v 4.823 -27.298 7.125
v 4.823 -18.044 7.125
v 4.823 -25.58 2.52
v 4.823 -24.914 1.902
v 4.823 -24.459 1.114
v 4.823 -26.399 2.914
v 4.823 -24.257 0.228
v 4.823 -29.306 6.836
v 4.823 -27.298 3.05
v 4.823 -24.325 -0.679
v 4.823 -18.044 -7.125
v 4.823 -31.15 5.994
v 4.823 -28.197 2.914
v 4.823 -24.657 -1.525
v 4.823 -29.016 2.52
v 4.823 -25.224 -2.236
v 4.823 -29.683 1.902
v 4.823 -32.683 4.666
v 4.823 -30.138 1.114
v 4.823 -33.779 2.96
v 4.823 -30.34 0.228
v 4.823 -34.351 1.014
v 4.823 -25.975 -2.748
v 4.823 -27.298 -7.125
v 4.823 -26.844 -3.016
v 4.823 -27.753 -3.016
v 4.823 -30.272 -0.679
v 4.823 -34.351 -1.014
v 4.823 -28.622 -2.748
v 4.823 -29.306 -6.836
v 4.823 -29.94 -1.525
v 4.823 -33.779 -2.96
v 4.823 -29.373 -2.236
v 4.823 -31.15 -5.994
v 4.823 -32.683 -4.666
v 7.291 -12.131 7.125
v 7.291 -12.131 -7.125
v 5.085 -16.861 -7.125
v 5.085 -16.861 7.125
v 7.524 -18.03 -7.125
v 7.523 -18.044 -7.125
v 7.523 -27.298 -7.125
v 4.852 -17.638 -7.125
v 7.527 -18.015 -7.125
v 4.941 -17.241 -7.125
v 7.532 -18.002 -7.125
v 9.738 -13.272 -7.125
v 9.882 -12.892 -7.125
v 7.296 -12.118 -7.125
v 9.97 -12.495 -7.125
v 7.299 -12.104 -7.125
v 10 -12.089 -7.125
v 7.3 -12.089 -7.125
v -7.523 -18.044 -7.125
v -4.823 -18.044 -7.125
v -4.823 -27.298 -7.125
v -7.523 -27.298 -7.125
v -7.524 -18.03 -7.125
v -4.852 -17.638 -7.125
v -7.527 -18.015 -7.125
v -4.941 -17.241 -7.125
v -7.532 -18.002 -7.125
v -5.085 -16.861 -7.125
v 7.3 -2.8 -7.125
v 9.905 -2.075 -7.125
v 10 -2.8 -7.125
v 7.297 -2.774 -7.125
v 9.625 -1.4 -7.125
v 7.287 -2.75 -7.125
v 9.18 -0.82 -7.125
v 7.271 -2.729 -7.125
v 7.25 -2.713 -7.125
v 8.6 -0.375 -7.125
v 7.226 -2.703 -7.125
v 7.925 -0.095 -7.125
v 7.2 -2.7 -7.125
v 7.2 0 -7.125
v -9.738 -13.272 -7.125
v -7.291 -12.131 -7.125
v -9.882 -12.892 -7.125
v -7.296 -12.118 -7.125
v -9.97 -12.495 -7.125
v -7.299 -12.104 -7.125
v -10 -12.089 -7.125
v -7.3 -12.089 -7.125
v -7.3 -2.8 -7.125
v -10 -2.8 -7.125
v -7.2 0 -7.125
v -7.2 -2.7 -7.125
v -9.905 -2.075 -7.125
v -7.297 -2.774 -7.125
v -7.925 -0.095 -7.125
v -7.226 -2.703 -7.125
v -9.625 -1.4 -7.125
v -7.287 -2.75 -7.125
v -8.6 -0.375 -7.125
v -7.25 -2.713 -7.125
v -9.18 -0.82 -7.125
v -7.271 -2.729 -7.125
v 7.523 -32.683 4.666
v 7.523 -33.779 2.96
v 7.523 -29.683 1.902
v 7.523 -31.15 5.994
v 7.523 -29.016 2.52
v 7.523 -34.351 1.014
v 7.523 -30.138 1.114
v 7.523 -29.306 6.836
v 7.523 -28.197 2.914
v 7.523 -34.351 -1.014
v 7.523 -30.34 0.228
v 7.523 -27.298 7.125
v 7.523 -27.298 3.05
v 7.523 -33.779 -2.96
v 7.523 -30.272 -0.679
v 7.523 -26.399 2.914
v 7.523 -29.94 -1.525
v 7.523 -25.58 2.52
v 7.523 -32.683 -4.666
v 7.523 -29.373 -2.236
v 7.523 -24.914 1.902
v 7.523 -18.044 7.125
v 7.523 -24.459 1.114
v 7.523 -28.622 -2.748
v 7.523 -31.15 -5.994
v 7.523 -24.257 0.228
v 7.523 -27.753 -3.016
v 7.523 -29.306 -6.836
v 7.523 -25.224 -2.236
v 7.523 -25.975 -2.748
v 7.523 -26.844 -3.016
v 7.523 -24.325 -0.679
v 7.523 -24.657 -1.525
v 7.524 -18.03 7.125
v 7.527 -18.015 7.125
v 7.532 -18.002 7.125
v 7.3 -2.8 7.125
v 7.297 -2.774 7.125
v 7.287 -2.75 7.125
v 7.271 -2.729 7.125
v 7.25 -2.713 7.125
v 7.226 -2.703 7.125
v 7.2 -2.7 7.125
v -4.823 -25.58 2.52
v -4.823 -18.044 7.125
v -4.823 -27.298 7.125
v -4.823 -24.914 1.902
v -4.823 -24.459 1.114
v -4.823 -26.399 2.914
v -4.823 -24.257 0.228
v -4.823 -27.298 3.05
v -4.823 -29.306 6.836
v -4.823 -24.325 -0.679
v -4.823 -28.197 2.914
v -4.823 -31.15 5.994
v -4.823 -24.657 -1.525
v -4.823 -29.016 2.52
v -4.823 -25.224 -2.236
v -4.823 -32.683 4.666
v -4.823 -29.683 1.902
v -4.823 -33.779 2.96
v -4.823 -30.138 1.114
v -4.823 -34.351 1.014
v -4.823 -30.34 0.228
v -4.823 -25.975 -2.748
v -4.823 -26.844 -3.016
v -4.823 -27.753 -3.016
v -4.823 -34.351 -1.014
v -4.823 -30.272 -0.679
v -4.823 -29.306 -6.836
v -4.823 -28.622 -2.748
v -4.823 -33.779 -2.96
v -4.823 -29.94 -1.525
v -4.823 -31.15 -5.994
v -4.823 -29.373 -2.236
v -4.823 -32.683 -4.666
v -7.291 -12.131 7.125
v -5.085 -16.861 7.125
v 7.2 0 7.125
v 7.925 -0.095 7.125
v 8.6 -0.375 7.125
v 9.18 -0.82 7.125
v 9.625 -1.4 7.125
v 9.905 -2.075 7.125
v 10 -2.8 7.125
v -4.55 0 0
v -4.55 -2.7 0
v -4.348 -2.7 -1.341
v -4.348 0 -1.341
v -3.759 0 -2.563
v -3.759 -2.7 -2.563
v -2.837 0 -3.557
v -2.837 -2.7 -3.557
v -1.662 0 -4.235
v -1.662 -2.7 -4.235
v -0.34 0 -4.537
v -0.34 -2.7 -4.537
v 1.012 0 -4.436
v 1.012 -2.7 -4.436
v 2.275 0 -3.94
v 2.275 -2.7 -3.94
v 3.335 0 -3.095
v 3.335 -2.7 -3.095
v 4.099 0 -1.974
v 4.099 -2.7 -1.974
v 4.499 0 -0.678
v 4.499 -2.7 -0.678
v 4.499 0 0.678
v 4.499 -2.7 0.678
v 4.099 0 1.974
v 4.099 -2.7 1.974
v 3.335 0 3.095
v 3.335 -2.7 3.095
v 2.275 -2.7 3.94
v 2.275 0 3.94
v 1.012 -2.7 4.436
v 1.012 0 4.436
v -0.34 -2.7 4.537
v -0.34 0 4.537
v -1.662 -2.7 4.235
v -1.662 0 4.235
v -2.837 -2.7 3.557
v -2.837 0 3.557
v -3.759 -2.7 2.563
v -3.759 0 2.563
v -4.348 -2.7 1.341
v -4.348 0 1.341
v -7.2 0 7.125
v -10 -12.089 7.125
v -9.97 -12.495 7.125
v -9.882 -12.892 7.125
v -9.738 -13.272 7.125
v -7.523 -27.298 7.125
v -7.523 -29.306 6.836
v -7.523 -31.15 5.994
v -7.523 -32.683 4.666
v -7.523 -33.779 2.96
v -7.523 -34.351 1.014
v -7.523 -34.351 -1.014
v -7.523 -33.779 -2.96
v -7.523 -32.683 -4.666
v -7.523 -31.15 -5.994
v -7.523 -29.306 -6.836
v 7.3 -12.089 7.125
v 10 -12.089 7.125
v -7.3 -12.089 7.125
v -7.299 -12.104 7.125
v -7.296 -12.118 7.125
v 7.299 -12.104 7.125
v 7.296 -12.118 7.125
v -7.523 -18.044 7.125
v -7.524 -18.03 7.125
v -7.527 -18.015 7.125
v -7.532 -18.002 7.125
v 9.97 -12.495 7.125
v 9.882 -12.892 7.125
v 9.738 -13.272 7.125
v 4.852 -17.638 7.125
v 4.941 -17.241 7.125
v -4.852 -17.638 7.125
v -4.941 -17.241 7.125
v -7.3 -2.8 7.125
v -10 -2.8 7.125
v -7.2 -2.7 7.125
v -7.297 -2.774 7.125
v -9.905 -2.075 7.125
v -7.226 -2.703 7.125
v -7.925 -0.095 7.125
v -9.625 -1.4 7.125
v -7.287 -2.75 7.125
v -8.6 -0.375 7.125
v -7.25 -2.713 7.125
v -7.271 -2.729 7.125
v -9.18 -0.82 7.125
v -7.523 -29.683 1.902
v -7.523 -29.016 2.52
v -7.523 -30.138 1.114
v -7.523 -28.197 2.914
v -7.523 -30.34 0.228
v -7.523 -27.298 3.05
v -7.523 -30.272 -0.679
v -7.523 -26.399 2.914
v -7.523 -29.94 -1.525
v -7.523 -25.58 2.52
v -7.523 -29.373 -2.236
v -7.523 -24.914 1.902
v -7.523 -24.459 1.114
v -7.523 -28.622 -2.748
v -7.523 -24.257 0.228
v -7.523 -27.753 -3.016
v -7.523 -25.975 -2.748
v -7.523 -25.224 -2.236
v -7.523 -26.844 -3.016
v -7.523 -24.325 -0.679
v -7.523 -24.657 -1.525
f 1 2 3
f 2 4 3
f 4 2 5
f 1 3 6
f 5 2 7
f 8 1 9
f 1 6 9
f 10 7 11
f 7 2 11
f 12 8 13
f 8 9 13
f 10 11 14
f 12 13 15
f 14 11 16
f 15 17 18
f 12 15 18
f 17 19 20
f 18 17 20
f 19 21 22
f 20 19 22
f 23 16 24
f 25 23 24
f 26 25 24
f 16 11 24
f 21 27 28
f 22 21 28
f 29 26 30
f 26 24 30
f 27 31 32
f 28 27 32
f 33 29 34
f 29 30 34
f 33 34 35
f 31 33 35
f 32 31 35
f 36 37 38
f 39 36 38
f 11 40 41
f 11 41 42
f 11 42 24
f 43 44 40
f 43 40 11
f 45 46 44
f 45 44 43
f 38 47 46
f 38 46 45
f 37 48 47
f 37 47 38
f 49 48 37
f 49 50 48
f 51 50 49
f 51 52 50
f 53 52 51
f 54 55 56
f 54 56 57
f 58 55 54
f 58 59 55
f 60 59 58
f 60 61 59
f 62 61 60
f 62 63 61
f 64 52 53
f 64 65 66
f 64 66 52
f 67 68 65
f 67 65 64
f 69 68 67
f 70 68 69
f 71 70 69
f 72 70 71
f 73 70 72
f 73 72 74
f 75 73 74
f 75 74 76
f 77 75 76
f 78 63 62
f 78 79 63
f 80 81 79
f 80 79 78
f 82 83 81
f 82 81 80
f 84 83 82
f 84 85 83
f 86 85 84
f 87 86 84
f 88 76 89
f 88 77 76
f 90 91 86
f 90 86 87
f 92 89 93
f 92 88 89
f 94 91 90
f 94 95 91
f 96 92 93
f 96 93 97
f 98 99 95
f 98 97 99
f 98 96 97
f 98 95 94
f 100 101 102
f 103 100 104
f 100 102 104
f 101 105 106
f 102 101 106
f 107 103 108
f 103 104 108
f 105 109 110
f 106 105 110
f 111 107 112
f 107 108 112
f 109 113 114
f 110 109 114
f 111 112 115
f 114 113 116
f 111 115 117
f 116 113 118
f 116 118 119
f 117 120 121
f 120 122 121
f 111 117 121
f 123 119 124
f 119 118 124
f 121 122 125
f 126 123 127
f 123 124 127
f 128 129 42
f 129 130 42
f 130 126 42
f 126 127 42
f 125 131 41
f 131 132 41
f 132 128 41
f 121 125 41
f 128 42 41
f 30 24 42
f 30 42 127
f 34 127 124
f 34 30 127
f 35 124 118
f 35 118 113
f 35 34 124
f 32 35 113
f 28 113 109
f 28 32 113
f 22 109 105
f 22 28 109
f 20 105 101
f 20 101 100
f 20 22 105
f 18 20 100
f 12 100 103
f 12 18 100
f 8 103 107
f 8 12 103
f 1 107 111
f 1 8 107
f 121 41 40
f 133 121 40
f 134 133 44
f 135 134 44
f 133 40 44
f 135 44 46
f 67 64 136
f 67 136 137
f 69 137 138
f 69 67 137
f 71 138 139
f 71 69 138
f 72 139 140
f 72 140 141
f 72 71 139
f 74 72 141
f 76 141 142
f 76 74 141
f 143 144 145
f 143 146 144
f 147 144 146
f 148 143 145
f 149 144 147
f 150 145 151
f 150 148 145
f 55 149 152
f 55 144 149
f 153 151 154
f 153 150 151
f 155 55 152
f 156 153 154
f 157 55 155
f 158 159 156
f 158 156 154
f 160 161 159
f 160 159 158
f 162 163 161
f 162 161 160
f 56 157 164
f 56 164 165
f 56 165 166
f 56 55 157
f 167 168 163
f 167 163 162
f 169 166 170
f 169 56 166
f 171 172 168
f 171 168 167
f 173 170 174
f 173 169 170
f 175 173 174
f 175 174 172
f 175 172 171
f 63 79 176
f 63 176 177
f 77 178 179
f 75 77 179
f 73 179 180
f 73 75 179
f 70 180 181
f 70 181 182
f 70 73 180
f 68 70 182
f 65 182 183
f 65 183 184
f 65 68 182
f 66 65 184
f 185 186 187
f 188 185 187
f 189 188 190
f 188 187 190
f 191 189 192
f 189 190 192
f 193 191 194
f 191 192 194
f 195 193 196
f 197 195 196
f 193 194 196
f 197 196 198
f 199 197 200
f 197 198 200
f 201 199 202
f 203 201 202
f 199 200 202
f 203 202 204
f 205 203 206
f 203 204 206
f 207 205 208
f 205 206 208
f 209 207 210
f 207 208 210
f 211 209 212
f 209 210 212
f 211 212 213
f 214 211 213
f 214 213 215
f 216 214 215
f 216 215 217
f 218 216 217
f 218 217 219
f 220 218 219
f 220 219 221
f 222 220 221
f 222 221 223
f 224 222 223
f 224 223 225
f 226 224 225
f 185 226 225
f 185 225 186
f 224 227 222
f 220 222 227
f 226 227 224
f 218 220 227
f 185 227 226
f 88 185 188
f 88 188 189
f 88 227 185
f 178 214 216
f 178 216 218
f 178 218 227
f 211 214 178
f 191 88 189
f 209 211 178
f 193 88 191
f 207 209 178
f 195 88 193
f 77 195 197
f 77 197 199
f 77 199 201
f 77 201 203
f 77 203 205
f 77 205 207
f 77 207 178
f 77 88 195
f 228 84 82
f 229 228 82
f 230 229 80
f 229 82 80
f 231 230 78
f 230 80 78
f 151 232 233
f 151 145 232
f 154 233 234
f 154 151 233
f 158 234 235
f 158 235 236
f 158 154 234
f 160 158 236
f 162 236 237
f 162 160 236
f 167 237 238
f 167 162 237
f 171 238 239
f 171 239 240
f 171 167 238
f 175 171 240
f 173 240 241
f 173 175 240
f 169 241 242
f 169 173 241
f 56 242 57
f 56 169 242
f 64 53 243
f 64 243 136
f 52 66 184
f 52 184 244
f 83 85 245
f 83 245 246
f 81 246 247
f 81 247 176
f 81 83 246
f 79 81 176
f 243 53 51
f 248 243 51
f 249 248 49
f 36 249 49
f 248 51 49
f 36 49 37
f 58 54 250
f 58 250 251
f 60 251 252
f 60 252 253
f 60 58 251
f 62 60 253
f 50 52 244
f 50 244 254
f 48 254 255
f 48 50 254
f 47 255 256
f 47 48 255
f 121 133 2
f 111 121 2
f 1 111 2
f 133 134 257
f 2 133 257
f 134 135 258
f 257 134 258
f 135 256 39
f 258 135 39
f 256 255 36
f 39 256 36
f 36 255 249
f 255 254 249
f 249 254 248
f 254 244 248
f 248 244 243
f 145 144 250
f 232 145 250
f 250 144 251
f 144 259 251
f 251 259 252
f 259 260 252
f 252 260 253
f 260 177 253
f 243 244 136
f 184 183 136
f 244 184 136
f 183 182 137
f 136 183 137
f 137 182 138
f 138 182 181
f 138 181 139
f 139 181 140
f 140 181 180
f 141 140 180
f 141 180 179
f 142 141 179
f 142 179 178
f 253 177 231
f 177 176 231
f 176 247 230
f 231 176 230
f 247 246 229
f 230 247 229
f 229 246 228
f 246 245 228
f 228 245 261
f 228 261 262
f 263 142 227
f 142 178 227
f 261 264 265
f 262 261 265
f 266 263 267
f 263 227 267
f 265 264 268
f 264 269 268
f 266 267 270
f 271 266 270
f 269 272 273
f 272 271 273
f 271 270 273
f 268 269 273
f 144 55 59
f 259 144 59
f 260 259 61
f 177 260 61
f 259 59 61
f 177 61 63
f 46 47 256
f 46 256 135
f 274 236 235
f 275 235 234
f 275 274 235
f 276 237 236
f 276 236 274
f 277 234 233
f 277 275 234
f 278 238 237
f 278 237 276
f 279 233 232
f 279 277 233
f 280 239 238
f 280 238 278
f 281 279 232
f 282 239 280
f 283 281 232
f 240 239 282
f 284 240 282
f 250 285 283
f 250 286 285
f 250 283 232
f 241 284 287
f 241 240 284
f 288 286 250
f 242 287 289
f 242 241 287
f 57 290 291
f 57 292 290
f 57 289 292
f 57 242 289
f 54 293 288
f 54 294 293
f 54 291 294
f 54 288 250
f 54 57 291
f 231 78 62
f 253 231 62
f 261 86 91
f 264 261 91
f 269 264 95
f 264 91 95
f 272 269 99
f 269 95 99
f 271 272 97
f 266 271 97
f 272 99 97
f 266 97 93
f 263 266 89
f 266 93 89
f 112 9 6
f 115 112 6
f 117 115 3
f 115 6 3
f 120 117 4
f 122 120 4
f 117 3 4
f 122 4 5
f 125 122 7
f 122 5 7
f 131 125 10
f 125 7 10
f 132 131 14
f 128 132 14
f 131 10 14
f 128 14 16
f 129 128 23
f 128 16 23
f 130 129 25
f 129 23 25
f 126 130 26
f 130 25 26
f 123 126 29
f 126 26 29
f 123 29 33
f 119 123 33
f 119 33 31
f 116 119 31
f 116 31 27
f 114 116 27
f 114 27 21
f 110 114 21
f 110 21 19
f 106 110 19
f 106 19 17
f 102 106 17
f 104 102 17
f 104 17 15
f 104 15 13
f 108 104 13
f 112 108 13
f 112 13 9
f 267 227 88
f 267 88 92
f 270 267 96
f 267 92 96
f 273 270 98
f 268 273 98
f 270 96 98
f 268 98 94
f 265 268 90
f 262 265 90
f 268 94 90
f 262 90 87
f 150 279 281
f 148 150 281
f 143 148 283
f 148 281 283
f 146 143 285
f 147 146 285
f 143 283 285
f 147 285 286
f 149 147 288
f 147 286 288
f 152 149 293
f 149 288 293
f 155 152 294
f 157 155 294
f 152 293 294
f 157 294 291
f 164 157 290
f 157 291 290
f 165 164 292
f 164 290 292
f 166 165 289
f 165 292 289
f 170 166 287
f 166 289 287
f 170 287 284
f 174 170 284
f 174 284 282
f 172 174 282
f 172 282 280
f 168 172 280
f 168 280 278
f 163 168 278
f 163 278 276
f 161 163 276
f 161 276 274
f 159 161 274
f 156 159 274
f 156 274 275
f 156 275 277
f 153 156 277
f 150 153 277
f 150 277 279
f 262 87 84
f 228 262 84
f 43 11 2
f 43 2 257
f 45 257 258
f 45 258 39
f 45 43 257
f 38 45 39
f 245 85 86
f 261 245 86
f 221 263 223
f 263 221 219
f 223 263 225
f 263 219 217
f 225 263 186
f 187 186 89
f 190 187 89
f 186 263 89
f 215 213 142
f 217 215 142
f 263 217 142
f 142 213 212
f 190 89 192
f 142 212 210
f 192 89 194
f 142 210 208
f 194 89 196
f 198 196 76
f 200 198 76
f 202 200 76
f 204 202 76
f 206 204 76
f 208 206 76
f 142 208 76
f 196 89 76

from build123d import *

# Parameters (mm, degrees)
ESBO_O1_W                      = 20
ESBO_O1_H                      = 14.25
FLANGE_BASE2_DEPTH             = 2.7
ARESTA_FLANGE1_STRIP_W         = 11
ARESTA_FLANGE1_STRIP_H         = 2.7
ARESTA_FLANGE1_STRIP_CUT_DEPTH = 14.25
ARESTA_FLANGE1_DEPTH           = 14.25
ARESTA_FLANGE4_START           = -7.125
ARESTA_FLANGE4_DEPTH           = 14.25
ARESTA_FLANGE4_2_DEPTH         = 14.25
ARESTA_FLANGE5_START           = -7.125
ARESTA_FLANGE5_DEPTH           = 14.25
ARESTA_FLANGE5_2_DEPTH         = 14.25
FILETE1_RADIUS                 = 7.125
FILETE1_LENGTH                 = 2.7
FILETE1_OF_ESPELHAR1_2_RADIUS  = 7.125
FILETE1_OF_ESPELHAR1_2_LENGTH  = 2.7
FURO_DE_DI_METRO_6_1_6_1_1_D   = 6.1
FURO_DE_DI_METRO_9_1_9_1_2_D   = 9.1


# Read off the part's stored shape, not the designer's step: Aresta-Flange4, Aresta-Flange5
# Sheet-metal steps are written as plain solids
with BuildPart() as part:
    # Esboço1 → Flange-base2 (new body)
    with BuildSketch(Plane(origin=(0, 0, 0), x_dir=(1, 0, 0), z_dir=(0, 1, 0))):
        Rectangle(ESBO_O1_W, ESBO_O1_H)
    extrude(amount=-FLANGE_BASE2_DEPTH)

    # Aresta-Flange1 strip (across the edge) → Aresta-Flange1 strip cut (cut)
    with BuildSketch(Plane(origin=(10, -2.7, -7.125), x_dir=(-1, 0, 0), z_dir=(0, 0, 1))):
        with Locations((-2.7, -1.35)):
            Rectangle(ARESTA_FLANGE1_STRIP_W, ARESTA_FLANGE1_STRIP_H)
    aresta_flange1_strip_cut = extrude(amount=ARESTA_FLANGE1_STRIP_CUT_DEPTH, mode=Mode.SUBTRACT)

    # Aresta-Flange1 section (across the edge) → Aresta-Flange1 (add)
    with BuildSketch(Plane(origin=(10, -2.7, -7.125), x_dir=(-1, 0, 0), z_dir=(0, 0, 1))):
        with BuildLine():
            Line((0, 0.1), (0, 15.8))
            Line((0, 15.8), (2.7, 15.8))
            Line((2.7, 15.8), (2.7, 0.1))
            ThreePointArc((2.7, 0.1), (2.729289322, 0.029289322), (2.8, 0))
            Line((2.8, 0), (2.8, -2.7))
            ThreePointArc((2.8, -2.7), (0.820101013, -1.879898987), (0, 0.1))
        make_face()
    aresta_flange1 = extrude(amount=ARESTA_FLANGE1_DEPTH)

    # Aresta-Flange4 outline → Aresta-Flange4 (cut)
    with BuildSketch(Plane.XY.offset(ARESTA_FLANGE4_START)):
        with BuildLine():
            ThreePointArc((10, -12.089086259), (9.93362882, -12.695117178), (9.737661804, -13.272417392))
            Line((9.737661804, -13.272417392), (7.3, -18.5))
            Line((7.3, -18.5), (10, -18.5))
            Line((10, -18.5), (10, -12.089086259))
        make_face()
    aresta_flange4 = extrude(amount=ARESTA_FLANGE4_DEPTH, mode=Mode.SUBTRACT)

    # Aresta-Flange4 2 outline → Aresta-Flange4 2 (add)
    with BuildSketch(Plane.XY.offset(ARESTA_FLANGE4_START)):
        with BuildLine():
            Line((4.822926294, -23.812101706), (7.3, -18.5))
            Line((7.3, -18.5), (7.3, -12.089086259))
            ThreePointArc((7.3, -12.089086259), (7.297629601, -12.11073022), (7.290630779, -12.131348085))
            Line((7.290630779, -12.131348085), (2.375895269, -22.671032399))
            Line((2.375895269, -22.671032399), (4.822926294, -23.812101706))
        make_face()
    aresta_flange4_2 = extrude(amount=ARESTA_FLANGE4_2_DEPTH)

    # Aresta-Flange5 outline → Aresta-Flange5 (cut)
    with BuildSketch(Plane.XY.offset(ARESTA_FLANGE5_START)):
        with BuildLine():
            Line((4.822926294, -23.812101706), (4.822926294, -18.044102487))
            ThreePointArc((4.822926294, -18.044102487), (4.889297474, -17.438071568), (5.08526449, -16.860771354))
            Line((5.08526449, -16.860771354), (2.375895269, -22.671032399))
            Line((2.375895269, -22.671032399), (4.822926294, -23.812101706))
        make_face()
    aresta_flange5 = extrude(amount=ARESTA_FLANGE5_DEPTH, mode=Mode.SUBTRACT)

    # Aresta-Flange5 2 outline → Aresta-Flange5 2 (add)
    with BuildSketch(Plane.XY.offset(ARESTA_FLANGE5_START)):
        with BuildLine():
            Line((7.532295515, -18.001840661), (4.822926294, -23.812101706))
            Line((4.822926294, -23.812101706), (4.822926294, -34.423357431))
            Line((4.822926294, -34.423357431), (7.522926294, -34.423357431))
            Line((7.522926294, -34.423357431), (7.522926294, -18.044102487))
            ThreePointArc((7.522926294, -18.044102487), (7.525296693, -18.022458526), (7.532295515, -18.001840661))
        make_face()
    aresta_flange5_2 = extrude(amount=ARESTA_FLANGE5_2_DEPTH)

    # Filete1: full round fillet: the end face becomes a half cylinder, R = half its width
    filete1_face = Plane((6.172926294, -34.423357431, 0), x_dir=(-1, 0, 0), z_dir=(0, -1, 0))  # on the end face: x along it, z out of the body
    filete1_slab = filete1_face.offset(-FILETE1_RADIUS / 2) * Box(FILETE1_LENGTH, 2 * FILETE1_RADIUS, FILETE1_RADIUS, mode=Mode.PRIVATE)  # the body's end, R deep
    filete1_round = Plane((6.172926294, -27.298357431, 0), x_dir=(0, -1, 0), z_dir=(-1, 0, 0)) * Cylinder(FILETE1_RADIUS, FILETE1_LENGTH, mode=Mode.PRIVATE)  # its axis R under the face
    add(filete1_slab - filete1_round, mode=Mode.SUBTRACT)

    # Espelhar1: Aresta-Flange1 strip cut, Aresta-Flange1, Aresta-Flange4, Aresta-Flange4 2, Aresta-Flange5, Aresta-Flange5 2 across plane
    add(aresta_flange1_strip_cut.mirror(Plane(origin=(0, 0, 0), x_dir=(0, 0, 1), z_dir=(1, 0, 0))), mode=Mode.SUBTRACT)
    add(aresta_flange1.mirror(Plane(origin=(0, 0, 0), x_dir=(0, 0, 1), z_dir=(1, 0, 0))))
    add(aresta_flange4.mirror(Plane(origin=(0, 0, 0), x_dir=(0, 0, 1), z_dir=(1, 0, 0))), mode=Mode.SUBTRACT)
    add(aresta_flange4_2.mirror(Plane(origin=(0, 0, 0), x_dir=(0, 0, 1), z_dir=(1, 0, 0))))
    add(aresta_flange5.mirror(Plane(origin=(0, 0, 0), x_dir=(0, 0, 1), z_dir=(1, 0, 0))), mode=Mode.SUBTRACT)
    add(aresta_flange5_2.mirror(Plane(origin=(0, 0, 0), x_dir=(0, 0, 1), z_dir=(1, 0, 0))))

    # Filete1 of Espelhar1 2: full round fillet: the end face becomes a half cylinder, R = half its width
    filete1_of_espelhar1_2_face = Plane((-6.172926294, -34.423357431, 0), x_dir=(1, 0, 0), z_dir=(0, -1, 0))  # on the end face: x along it, z out of the body
    filete1_of_espelhar1_2_slab = filete1_of_espelhar1_2_face.offset(-FILETE1_OF_ESPELHAR1_2_RADIUS / 2) * Box(FILETE1_OF_ESPELHAR1_2_LENGTH, 2 * FILETE1_OF_ESPELHAR1_2_RADIUS, FILETE1_OF_ESPELHAR1_2_RADIUS, mode=Mode.PRIVATE)  # the body's end, R deep
    filete1_of_espelhar1_2_round = Plane((-6.172926294, -27.298357431, 0), x_dir=(0, -1, 0), z_dir=(1, 0, 0)) * Cylinder(FILETE1_OF_ESPELHAR1_2_RADIUS, FILETE1_OF_ESPELHAR1_2_LENGTH, mode=Mode.PRIVATE)  # its axis R under the face
    add(filete1_of_espelhar1_2_slab - filete1_of_espelhar1_2_round, mode=Mode.SUBTRACT)

    # Furo de diâmetro Ø6.1 (6.1)1 (through all)
    with Locations(Plane(origin=(7.522926294, 0, 0), x_dir=(0, 0, -1), z_dir=(1, 0, 0))):
        with Locations((0, -27.298357431)):
            Hole(FURO_DE_DI_METRO_6_1_6_1_1_D / 2)

    # Furo de diâmetro Ø9.1 (9.1)2 (through all)
    with Locations(Plane(origin=(0, 0, 0), x_dir=(1, 0, 0), z_dir=(0, 1, 0))):
        with Locations((0, 0)):
            Hole(FURO_DE_DI_METRO_9_1_9_1_2_D / 2)


solid = part.part
